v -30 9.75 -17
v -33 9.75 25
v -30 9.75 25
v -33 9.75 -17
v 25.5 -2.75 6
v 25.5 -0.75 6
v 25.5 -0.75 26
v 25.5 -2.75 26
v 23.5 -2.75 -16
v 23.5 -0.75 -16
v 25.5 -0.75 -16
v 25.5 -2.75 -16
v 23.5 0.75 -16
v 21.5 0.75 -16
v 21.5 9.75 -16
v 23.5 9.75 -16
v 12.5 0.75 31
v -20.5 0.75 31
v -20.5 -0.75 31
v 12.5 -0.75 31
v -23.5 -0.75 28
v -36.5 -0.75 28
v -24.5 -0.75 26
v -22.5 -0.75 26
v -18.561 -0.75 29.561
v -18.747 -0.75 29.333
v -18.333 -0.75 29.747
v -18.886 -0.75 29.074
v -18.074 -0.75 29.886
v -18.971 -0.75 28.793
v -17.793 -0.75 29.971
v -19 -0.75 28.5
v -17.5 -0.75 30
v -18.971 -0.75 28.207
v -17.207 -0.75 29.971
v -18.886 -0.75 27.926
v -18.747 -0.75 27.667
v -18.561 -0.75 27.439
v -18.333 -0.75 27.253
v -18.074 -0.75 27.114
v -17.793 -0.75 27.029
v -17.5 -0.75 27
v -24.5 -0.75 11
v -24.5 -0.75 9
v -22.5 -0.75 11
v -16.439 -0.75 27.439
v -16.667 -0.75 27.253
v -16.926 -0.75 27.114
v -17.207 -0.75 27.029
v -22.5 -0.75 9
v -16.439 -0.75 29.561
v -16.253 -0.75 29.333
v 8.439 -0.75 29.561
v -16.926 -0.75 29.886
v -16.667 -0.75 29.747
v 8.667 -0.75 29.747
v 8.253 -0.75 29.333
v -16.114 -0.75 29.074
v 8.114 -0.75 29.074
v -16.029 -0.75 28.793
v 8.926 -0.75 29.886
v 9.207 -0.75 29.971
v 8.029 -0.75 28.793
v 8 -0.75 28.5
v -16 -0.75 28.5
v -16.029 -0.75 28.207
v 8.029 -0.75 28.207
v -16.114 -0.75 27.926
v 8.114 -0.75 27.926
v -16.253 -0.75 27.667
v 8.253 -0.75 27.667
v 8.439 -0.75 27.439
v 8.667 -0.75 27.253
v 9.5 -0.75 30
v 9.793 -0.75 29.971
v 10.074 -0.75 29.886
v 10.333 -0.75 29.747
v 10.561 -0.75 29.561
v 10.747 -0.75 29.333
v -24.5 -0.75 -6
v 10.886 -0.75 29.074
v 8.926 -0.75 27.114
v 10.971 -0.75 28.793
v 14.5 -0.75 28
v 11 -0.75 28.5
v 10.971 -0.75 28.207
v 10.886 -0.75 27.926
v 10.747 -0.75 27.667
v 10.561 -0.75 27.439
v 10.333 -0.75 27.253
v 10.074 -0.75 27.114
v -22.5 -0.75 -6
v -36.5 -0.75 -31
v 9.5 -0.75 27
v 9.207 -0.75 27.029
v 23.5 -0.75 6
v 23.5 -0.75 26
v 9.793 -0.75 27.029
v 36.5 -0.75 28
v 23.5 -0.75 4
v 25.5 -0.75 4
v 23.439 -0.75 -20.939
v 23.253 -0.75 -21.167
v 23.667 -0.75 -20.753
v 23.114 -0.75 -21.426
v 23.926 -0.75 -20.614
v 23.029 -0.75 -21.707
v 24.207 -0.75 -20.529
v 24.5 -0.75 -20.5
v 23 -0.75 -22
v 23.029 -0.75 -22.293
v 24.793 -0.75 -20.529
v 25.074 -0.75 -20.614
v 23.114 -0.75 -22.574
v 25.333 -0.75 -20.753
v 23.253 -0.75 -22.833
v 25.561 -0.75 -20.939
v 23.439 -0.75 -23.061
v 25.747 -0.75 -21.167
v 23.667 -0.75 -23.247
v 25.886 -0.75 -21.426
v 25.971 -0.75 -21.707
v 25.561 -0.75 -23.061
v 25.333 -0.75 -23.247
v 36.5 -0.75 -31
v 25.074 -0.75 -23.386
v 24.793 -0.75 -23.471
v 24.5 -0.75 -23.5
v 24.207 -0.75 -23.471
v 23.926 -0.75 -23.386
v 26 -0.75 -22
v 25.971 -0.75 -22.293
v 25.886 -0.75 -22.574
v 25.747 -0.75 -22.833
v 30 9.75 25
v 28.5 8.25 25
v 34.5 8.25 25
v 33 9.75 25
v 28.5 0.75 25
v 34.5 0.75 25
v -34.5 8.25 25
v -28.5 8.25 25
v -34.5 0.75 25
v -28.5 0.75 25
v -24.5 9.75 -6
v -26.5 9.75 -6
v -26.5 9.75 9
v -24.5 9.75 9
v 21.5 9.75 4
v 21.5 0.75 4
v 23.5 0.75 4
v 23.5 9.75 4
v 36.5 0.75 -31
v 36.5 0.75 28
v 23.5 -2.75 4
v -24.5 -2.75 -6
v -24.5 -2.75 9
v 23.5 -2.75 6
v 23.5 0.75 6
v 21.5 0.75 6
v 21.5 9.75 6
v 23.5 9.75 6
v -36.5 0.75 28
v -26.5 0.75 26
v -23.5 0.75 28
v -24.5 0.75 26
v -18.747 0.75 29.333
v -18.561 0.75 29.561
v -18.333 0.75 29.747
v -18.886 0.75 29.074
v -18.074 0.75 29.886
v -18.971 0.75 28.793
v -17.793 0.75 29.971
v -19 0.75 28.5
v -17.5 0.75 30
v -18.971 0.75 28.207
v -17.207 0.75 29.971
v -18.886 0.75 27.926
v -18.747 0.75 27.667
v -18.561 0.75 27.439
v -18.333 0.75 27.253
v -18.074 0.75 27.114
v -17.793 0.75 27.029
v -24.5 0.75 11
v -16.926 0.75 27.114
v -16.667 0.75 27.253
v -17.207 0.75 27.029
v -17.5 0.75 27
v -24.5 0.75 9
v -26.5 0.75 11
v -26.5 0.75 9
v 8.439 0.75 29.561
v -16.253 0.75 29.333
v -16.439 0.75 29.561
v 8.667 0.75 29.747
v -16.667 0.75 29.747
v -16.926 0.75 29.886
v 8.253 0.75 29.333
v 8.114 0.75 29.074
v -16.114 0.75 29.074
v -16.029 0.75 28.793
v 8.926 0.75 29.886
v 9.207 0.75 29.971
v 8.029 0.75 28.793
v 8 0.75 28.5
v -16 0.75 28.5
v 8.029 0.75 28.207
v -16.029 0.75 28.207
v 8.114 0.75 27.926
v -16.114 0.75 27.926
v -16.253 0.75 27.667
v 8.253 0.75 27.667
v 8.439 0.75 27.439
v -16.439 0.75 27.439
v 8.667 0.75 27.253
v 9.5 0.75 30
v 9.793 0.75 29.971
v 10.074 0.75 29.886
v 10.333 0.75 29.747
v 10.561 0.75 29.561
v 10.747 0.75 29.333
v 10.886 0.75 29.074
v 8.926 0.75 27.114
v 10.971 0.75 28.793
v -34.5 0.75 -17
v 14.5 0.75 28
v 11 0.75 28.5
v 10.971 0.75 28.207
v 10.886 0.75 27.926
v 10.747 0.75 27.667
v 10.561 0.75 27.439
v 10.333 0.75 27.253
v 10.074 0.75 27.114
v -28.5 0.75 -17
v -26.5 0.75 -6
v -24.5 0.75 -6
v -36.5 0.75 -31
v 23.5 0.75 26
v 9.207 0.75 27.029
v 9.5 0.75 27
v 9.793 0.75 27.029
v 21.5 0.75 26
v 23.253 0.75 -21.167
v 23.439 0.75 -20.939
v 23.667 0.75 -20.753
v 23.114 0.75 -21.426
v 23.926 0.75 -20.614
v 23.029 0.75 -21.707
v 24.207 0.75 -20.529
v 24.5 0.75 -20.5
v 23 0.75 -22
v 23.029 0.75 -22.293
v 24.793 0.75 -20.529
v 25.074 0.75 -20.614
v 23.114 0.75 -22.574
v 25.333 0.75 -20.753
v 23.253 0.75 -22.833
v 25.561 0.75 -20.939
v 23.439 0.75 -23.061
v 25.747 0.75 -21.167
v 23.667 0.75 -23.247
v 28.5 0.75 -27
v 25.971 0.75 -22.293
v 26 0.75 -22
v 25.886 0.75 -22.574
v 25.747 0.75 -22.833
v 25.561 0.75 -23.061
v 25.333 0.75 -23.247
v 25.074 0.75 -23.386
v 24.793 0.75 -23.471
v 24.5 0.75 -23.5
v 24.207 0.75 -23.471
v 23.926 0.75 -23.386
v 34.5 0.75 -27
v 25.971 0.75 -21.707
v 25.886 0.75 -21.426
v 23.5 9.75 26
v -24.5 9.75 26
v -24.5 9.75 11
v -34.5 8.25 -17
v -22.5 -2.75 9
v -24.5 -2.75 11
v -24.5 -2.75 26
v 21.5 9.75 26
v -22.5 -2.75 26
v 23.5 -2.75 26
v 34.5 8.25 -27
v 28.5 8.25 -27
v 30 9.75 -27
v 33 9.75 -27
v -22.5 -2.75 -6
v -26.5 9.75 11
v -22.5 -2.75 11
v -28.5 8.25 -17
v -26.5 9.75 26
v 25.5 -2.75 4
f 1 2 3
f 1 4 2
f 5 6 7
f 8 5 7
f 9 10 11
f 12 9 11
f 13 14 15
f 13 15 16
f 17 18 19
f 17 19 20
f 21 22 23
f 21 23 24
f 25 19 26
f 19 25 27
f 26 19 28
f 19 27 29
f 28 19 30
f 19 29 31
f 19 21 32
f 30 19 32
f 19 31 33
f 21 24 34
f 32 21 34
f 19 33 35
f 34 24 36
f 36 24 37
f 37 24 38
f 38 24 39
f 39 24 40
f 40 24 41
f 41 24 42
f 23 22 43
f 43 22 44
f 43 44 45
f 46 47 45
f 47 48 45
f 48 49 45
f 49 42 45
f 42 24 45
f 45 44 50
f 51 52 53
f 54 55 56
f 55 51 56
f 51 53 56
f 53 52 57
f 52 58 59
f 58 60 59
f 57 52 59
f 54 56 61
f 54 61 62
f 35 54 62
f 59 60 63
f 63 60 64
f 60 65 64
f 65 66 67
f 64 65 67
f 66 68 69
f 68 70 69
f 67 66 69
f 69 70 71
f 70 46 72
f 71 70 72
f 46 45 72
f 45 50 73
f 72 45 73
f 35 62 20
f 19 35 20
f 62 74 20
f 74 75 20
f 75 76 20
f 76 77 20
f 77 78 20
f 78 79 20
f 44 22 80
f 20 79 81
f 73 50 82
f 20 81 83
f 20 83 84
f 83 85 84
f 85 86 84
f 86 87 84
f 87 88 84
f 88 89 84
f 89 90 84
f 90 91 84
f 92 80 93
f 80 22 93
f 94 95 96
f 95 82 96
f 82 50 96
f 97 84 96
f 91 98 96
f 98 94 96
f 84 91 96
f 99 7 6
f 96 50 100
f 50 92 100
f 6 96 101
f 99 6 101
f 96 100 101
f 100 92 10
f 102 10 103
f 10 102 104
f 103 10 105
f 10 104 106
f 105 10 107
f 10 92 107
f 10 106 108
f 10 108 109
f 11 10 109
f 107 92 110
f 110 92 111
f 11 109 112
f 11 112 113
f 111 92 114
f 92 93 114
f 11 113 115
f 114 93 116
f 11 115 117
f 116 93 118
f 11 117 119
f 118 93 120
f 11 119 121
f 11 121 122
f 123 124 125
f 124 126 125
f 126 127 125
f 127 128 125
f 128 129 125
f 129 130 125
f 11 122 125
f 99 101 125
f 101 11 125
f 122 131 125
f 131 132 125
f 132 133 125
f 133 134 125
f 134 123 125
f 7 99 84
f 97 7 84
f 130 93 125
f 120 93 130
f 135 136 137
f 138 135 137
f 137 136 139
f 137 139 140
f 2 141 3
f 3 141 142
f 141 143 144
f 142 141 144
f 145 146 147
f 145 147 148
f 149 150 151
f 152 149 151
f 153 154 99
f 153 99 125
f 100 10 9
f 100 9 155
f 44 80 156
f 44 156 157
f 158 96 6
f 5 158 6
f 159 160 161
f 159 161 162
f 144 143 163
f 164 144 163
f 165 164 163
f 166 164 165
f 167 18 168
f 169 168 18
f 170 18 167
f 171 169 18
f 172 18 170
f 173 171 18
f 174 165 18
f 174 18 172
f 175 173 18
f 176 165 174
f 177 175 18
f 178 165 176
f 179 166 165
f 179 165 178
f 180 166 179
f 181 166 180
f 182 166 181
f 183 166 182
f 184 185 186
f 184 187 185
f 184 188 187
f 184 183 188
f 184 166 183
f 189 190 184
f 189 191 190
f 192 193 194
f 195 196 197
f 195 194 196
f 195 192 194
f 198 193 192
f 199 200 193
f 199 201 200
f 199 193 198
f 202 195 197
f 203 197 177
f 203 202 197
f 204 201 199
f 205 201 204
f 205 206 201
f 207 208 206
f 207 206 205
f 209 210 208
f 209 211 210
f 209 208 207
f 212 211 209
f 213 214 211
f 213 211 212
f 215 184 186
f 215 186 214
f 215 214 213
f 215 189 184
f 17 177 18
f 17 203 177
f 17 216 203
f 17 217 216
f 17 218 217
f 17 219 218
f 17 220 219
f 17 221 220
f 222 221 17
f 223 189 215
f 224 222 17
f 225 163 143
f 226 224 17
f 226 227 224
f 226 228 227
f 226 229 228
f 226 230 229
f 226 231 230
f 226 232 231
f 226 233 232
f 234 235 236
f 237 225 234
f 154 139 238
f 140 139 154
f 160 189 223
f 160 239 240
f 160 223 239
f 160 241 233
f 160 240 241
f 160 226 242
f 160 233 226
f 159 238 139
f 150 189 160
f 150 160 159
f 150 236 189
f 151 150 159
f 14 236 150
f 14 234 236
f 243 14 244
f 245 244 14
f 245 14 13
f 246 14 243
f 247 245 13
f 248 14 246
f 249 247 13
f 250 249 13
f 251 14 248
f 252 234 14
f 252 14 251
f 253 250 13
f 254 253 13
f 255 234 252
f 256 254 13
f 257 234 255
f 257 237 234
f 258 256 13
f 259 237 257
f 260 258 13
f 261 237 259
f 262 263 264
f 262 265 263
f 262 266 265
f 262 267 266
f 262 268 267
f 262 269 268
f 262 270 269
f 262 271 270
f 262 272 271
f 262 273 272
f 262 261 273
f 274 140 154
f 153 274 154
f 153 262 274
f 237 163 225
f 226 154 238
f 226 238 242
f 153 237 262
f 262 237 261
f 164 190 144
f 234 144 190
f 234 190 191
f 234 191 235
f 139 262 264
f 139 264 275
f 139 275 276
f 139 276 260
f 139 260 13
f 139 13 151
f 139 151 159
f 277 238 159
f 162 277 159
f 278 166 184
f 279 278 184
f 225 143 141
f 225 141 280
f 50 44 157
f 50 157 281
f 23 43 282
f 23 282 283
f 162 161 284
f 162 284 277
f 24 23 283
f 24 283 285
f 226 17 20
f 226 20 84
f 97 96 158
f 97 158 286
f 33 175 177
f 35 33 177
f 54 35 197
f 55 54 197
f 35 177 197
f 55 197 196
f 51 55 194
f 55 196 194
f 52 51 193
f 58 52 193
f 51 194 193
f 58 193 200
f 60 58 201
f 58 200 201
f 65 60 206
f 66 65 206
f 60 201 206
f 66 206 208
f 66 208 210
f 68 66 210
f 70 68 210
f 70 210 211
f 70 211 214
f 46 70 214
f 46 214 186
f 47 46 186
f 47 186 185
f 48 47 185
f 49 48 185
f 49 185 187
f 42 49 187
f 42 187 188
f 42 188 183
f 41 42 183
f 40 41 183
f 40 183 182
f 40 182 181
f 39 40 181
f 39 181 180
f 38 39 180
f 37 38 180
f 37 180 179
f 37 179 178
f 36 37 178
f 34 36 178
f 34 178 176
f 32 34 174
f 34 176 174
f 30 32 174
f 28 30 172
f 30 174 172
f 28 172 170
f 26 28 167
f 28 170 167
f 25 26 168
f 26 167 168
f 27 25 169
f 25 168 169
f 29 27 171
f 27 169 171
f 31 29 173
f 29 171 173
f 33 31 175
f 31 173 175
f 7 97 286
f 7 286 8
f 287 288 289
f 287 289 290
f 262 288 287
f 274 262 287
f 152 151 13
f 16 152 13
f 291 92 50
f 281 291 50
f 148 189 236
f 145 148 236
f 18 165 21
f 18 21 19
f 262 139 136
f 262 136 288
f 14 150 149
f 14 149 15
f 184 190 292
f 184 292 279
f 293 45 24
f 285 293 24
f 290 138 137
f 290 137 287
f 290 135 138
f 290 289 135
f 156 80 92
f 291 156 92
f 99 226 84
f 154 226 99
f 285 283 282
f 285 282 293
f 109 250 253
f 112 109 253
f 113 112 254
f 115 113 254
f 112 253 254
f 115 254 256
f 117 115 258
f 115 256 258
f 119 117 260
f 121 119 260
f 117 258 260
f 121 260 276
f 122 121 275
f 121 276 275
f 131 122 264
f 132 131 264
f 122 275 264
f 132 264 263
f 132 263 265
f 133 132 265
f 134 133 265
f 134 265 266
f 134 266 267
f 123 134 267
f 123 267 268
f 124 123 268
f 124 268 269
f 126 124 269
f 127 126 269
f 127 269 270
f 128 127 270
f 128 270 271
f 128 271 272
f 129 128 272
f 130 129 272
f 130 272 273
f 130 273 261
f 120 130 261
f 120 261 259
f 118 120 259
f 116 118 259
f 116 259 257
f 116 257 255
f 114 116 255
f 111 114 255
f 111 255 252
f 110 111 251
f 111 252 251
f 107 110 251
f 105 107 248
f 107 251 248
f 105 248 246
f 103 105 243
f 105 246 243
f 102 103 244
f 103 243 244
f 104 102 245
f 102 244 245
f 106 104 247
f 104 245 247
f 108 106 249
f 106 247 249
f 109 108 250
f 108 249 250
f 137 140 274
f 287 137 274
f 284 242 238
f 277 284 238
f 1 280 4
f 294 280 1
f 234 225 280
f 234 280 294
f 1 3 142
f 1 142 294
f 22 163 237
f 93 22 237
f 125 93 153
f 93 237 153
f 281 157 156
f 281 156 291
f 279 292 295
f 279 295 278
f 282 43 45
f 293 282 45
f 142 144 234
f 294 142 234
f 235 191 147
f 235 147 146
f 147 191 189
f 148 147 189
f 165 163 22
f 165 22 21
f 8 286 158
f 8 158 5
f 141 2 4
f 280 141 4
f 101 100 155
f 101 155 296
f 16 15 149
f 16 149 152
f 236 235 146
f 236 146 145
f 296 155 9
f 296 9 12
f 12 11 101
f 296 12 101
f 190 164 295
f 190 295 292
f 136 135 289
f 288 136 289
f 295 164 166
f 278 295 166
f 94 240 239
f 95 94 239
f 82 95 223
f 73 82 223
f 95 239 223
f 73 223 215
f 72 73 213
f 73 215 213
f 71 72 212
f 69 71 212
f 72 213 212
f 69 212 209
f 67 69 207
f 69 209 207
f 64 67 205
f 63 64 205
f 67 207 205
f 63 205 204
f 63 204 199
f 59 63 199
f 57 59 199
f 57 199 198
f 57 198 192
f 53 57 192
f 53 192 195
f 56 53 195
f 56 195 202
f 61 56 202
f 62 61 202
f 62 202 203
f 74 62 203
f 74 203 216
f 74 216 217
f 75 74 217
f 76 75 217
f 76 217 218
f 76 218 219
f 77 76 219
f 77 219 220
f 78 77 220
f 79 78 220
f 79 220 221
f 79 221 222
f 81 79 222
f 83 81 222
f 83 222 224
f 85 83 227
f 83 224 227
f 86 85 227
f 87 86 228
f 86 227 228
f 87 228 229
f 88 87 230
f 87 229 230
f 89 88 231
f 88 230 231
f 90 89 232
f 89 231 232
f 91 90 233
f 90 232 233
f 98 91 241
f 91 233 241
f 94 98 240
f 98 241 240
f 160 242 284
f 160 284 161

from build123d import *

# Parameters (mm, degrees)
SKETCH1_W           = 73
SKETCH1_H           = 62
BOSS_EXTRUDE1_DEPTH = 0.75
CUT_EXTRUDE1_DEPTH  = 2
SKETCH3_R           = 1.5
CUT_EXTRUDE2_DEPTH  = 2
SKETCH4_W           = 6
SKETCH4_H           = 42
SKETCH4_H_2         = 52
SKETCH4_W_2         = 2
SKETCH4_H_3         = 15
SKETCH4_H_4         = 20
BOSS_EXTRUDE2_DEPTH = 9
CHAMFER1_SIZE       = 1.5
SKETCH5_W           = 2
SKETCH5_H           = 15
BOSS_EXTRUDE3_DEPTH = 2
SKETCH6_W           = 2
SKETCH6_H           = 20
BOSS_EXTRUDE4_DEPTH = 2


with BuildPart() as part:
    # Sketch1 → Boss-Extrude1 (new, symmetric)
    with BuildSketch(Plane(origin=(0, 0, 0), x_dir=(1, 0, 0), z_dir=(0, 1, 0))):
        Rectangle(SKETCH1_W, SKETCH1_H)
    extrude(amount=BOSS_EXTRUDE1_DEPTH, both=True)

    # Sketch2 → Cut-Extrude1 (cut)
    with BuildSketch(Plane(origin=(0, 0.75, 0), x_dir=(1, 0, 0), z_dir=(0, 1, 0))):
        Polygon((-36.5, -31), (-36.5, -28), (-23.5, -28), (-20.5, -31), align=None)
        Polygon((36.5, -31), (12.5, -31), (14.5, -28), (36.5, -28), align=None)
    extrude(amount=-CUT_EXTRUDE1_DEPTH, mode=Mode.SUBTRACT)

    # Sketch3 → Cut-Extrude2 (cut)
    with BuildSketch(Plane(origin=(0, 0.75, 0), x_dir=(1, 0, 0), z_dir=(0, 1, 0))):
        with Locations(Location((-17.5, -28.5, 0), (0, 0, 270))):
            Circle(SKETCH3_R)
        with Locations(Location((9.5, -28.5, 0), (0, 0, 90))):
            Circle(SKETCH3_R)
        with Locations(Location((24.5, 22, 0), (0, 0, 270))):
            Circle(SKETCH3_R)
    extrude(amount=-CUT_EXTRUDE2_DEPTH, mode=Mode.SUBTRACT)

    # Sketch4 → Boss-Extrude2 (add)
    with BuildSketch(Plane(origin=(0, 0.75, 0), x_dir=(1, 0, 0), z_dir=(0, 1, 0))):
        with Locations((-31.5, -4)):
            Rectangle(SKETCH4_W, SKETCH4_H)
        with Locations((31.5, 1)):
            Rectangle(SKETCH4_W, SKETCH4_H_2)
        with Locations((-25.5, -1.5)):
            Rectangle(SKETCH4_W_2, SKETCH4_H_3)
        with Locations((-25.5, -18.5)):
            Rectangle(SKETCH4_W_2, SKETCH4_H_3)
        with Locations((22.5, 6)):
            Rectangle(SKETCH4_W_2, SKETCH4_H_4)
        with Locations((22.5, -16)):
            Rectangle(SKETCH4_W_2, SKETCH4_H_4)
    extrude(amount=BOSS_EXTRUDE2_DEPTH)

    # Chamfer1
    chamfer1_edges = [part.edges().sort_by_distance(p)[0] for p in [
        (-34.5, 9.75, 4),
        (-28.5, 9.75, 4),
        (34.5, 9.75, -1),
        (28.5, 9.75, -1),
    ]]
    chamfer(chamfer1_edges, length=CHAMFER1_SIZE)

    # Sketch5 → Boss-Extrude3 (add)
    with BuildSketch(Plane.XZ.offset(0.75)):
        with Locations((-23.5, 18.5)):
            Rectangle(SKETCH5_W, SKETCH5_H)
        with Locations((-23.5, 1.5)):
            Rectangle(SKETCH5_W, SKETCH5_H)
    extrude(amount=BOSS_EXTRUDE3_DEPTH)

    # Sketch6 → Boss-Extrude4 (add)
    with BuildSketch(Plane.XZ.offset(0.75)):
        with Locations((24.5, 16)):
            Rectangle(SKETCH6_W, SKETCH6_H)
        with Locations((24.5, -6)):
            Rectangle(SKETCH6_W, SKETCH6_H)
    extrude(amount=BOSS_EXTRUDE4_DEPTH)


solid = part.part
